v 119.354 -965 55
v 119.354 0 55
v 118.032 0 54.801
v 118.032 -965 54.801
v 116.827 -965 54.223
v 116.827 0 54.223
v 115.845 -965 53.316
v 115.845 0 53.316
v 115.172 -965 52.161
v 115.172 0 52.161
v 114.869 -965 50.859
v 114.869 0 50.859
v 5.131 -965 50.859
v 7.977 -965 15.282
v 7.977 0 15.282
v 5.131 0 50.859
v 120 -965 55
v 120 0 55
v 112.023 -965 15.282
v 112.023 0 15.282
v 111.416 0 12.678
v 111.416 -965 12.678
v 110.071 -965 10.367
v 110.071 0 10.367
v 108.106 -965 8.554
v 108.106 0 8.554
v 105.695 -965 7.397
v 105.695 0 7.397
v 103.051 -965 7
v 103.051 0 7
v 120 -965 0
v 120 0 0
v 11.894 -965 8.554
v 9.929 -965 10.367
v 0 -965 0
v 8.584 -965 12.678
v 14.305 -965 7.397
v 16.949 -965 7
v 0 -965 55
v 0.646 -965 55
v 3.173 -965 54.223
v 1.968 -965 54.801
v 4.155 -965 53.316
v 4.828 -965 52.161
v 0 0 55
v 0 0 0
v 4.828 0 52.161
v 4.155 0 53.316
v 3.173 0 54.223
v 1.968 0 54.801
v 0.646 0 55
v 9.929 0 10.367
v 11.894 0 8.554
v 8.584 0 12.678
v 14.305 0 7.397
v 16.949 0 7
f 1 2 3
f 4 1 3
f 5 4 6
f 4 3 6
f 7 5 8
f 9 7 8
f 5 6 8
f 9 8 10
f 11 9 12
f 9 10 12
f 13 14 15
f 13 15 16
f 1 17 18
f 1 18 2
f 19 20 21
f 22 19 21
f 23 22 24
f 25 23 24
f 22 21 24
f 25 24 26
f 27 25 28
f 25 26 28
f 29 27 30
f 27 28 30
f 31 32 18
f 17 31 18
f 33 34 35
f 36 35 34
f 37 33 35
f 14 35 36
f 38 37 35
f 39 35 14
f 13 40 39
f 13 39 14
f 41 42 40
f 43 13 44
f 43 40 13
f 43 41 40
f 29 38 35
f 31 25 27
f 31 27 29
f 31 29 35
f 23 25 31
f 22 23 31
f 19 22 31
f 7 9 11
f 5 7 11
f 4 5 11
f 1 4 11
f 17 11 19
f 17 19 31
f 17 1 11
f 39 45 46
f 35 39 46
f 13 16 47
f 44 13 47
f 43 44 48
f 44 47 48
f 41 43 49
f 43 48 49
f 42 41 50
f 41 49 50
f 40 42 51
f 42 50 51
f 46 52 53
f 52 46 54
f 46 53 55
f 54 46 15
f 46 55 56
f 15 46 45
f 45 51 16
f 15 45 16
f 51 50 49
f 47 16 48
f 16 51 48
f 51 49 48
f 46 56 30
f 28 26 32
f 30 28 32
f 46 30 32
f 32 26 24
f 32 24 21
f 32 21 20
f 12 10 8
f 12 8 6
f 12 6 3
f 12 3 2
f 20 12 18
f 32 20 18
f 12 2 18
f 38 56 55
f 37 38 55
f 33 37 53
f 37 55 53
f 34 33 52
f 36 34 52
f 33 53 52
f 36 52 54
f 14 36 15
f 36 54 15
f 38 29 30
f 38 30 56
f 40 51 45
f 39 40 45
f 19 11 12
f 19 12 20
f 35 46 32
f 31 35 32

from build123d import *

# Parameters (mm, degrees)
F1_DEPTH = 965


with BuildPart() as f1:
    # F0 (on Front) → F1 (new body)
    with BuildSketch(Plane.XZ):
        with BuildLine():
            Line((0.645623, 55), (0, 55))
            Line((0, 55), (0, 0))
            Line((0, 0), (120, 0))
            Line((120, 0), (120, 55))
            Line((120, 55), (119.354377, 55))
            ThreePointArc((119.354377, 55), (116.301906, 53.806421), (114.868708, 50.858854))
            Line((114.868708, 50.858854), (112.022583, 15.282293))
            ThreePointArc((112.022583, 15.282293), (109.156188, 9.387158), (103.051246, 7))
            Line((103.051246, 7), (16.948754, 7))
            ThreePointArc((16.948754, 7), (10.843812, 9.387158), (7.977417, 15.282293))
            Line((7.977417, 15.282293), (5.131292, 50.858854))
            ThreePointArc((5.131292, 50.858854), (3.698094, 53.806421), (0.645623, 55))
        make_face()
    extrude(amount=F1_DEPTH)


solid = f1.part
